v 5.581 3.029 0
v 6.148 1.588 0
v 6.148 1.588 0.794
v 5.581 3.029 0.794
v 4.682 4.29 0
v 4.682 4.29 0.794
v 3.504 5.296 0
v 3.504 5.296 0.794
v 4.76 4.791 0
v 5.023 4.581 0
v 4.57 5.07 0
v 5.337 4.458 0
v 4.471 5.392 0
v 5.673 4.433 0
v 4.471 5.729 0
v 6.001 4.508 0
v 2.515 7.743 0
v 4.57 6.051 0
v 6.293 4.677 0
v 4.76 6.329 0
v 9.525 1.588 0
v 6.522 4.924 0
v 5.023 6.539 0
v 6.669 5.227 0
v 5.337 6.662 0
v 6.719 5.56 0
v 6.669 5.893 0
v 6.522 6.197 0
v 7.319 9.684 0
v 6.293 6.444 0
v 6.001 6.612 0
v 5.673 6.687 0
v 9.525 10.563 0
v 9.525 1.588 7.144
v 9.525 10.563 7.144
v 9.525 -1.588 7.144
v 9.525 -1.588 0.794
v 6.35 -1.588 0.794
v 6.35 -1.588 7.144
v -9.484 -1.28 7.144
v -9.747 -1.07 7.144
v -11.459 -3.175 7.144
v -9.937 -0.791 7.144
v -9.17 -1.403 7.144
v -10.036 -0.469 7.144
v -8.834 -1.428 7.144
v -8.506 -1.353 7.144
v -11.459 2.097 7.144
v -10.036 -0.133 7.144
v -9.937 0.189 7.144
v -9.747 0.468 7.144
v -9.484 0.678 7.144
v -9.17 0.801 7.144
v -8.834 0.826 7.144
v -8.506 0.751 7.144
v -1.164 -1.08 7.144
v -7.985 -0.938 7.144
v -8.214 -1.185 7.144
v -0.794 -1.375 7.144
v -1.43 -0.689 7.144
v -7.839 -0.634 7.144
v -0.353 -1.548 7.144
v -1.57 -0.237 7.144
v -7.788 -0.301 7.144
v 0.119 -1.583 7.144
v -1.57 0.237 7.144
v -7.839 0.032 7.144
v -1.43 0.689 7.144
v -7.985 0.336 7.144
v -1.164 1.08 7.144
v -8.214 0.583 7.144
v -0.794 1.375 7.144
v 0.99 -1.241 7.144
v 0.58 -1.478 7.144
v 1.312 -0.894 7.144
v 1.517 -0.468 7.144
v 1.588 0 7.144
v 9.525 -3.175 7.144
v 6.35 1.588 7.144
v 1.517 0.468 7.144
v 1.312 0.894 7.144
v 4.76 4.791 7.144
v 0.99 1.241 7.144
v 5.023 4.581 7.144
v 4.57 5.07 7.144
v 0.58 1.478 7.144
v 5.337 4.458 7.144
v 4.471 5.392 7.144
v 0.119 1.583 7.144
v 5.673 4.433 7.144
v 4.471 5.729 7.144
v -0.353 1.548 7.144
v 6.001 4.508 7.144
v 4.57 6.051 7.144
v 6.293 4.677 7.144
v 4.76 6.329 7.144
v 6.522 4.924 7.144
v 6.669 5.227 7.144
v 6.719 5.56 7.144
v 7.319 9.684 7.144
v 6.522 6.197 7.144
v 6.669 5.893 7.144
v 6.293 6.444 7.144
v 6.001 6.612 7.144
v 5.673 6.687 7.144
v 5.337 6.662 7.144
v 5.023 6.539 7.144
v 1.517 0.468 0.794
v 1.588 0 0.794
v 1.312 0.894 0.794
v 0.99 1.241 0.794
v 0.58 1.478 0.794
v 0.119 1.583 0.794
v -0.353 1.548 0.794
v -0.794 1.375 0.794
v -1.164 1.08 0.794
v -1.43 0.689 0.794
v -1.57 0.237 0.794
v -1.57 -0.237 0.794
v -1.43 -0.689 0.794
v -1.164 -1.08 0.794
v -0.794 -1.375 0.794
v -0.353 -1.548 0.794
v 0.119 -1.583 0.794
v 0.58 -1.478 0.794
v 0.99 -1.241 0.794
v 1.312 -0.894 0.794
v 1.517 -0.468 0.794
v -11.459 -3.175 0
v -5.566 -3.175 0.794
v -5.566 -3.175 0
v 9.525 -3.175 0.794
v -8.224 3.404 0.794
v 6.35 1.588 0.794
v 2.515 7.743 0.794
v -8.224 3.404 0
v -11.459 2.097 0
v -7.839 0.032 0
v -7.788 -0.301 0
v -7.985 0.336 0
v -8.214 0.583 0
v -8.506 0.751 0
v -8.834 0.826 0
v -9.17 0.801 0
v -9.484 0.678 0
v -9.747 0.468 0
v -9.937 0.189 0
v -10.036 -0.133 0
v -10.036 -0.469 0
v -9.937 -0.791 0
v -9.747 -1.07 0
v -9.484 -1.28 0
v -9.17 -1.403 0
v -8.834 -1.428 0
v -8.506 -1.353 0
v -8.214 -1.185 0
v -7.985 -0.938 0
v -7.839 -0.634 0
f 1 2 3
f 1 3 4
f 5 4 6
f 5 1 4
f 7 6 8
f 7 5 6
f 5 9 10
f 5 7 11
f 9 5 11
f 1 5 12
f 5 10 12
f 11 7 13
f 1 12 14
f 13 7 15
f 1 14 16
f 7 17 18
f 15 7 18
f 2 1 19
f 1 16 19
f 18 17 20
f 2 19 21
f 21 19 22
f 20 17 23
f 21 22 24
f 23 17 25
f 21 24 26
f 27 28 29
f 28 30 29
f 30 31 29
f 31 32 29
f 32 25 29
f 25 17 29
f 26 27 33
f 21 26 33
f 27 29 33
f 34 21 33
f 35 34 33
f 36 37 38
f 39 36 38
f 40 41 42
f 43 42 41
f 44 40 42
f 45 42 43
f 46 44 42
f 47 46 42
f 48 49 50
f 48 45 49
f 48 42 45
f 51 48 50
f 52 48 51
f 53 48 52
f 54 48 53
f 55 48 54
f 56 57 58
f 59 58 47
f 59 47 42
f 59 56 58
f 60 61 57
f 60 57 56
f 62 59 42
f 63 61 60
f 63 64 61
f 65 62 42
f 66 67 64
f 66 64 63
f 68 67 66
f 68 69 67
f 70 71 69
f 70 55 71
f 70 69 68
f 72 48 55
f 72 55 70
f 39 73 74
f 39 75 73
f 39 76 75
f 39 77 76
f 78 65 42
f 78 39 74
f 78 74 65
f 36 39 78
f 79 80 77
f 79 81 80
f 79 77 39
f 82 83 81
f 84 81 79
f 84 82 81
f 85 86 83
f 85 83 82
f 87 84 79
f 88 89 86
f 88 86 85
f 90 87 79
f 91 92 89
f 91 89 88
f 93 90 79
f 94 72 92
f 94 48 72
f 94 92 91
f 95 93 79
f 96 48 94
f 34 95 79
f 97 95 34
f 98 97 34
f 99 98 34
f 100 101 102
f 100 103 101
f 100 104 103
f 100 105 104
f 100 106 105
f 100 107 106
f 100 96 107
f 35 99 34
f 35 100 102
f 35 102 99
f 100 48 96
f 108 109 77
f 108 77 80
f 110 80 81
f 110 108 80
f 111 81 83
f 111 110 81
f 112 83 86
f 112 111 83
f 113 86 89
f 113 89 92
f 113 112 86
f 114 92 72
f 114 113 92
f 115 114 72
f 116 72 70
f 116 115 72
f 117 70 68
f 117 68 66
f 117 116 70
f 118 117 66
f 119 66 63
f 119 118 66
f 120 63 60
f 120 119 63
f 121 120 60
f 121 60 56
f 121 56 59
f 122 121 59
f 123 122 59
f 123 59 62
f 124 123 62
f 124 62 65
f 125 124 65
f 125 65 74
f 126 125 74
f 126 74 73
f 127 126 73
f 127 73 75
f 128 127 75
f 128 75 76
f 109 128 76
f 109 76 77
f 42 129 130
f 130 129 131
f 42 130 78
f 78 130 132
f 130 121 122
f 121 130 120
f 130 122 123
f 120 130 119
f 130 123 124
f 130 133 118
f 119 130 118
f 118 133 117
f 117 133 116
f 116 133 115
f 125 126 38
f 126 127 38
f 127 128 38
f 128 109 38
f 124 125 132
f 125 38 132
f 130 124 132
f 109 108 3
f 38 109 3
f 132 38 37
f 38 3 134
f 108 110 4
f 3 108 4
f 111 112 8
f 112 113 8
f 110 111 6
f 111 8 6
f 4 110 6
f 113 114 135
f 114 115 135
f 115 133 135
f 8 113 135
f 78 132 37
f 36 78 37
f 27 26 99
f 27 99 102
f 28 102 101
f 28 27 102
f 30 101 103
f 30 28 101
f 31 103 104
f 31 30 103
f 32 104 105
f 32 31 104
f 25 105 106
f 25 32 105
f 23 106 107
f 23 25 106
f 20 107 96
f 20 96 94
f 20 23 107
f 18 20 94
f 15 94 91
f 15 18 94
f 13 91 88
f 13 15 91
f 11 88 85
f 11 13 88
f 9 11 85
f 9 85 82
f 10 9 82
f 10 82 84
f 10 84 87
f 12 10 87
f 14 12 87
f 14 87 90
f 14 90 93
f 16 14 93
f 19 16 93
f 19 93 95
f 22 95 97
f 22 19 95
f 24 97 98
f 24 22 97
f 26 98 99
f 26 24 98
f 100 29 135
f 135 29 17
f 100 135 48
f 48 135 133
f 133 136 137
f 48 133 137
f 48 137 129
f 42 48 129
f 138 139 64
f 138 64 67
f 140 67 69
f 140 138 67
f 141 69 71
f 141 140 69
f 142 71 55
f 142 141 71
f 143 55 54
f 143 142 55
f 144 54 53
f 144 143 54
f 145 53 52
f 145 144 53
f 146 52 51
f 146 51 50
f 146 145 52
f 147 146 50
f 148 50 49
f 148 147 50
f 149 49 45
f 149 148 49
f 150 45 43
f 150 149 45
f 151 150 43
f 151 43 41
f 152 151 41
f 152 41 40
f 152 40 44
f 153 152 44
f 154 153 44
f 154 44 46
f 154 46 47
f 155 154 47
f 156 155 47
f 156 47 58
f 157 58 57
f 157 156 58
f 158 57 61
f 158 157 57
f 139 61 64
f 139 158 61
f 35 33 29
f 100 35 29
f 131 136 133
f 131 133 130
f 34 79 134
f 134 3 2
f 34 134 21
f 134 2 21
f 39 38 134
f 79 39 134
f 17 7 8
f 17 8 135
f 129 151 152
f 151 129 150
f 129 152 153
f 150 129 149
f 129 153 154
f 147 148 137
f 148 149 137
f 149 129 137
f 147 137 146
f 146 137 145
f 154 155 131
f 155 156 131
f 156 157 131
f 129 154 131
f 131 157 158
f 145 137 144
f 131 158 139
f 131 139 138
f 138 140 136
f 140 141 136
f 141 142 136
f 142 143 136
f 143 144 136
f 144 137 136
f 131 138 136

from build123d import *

# Parameters (mm, degrees)
SKETCH1_R           = 1.5875
SKETCH1_R_2         = 1.1303
BOSS_EXTRUDE1_DEPTH = 7.14375
SKETCH2_R           = 1.5875
CUT_EXTRUDE1_DEPTH  = 0.79375


with BuildPart() as part:
    # Sketch1 → Boss-Extrude1 (new body)
    with BuildSketch(Plane.XY):
        Polygon((6.35, 1.5875), (9.525, 1.5875), (9.525, 4.224628752), (9.525, 10.562648806), (7.319307862, 9.683908365), (-11.458663934, 2.097115291), (-11.458663934, -3.175), (9.525, -3.175), (9.525, -1.5875), (6.35, -1.5875), align=None)
        Circle(SKETCH1_R, mode=Mode.SUBTRACT)
        with Locations((-8.918663934, -0.301005903)):
            Circle(SKETCH1_R_2, mode=Mode.SUBTRACT)
        with Locations((5.588425528, 5.5602387)):
            Circle(SKETCH1_R_2, mode=Mode.SUBTRACT)
    extrude(amount=BOSS_EXTRUDE1_DEPTH)

    # Sketch2 → Cut-Extrude1 (cut)
    with BuildSketch(Plane.XY):
        with BuildLine():
            Line((9.525, 1.5875), (6.148361062, 1.5875))
            ThreePointArc((6.148361062, 1.5875), (5.169946467, 3.687025023), (3.503620258, 5.29595554))
            Line((3.503620258, 5.29595554), (2.515012001, 7.742846841))
            Line((2.515012001, 7.742846841), (-8.224002276, 3.404003433))
            Line((-8.224002276, 3.404003433), (-5.565912349, -3.175))
            Line((-5.565912349, -3.175), (9.525, -3.175))
            Line((9.525, -3.175), (9.525, 1.5875))
        make_face()
        Circle(SKETCH2_R, mode=Mode.SUBTRACT)
    extrude(amount=CUT_EXTRUDE1_DEPTH, mode=Mode.SUBTRACT)


solid = part.part
